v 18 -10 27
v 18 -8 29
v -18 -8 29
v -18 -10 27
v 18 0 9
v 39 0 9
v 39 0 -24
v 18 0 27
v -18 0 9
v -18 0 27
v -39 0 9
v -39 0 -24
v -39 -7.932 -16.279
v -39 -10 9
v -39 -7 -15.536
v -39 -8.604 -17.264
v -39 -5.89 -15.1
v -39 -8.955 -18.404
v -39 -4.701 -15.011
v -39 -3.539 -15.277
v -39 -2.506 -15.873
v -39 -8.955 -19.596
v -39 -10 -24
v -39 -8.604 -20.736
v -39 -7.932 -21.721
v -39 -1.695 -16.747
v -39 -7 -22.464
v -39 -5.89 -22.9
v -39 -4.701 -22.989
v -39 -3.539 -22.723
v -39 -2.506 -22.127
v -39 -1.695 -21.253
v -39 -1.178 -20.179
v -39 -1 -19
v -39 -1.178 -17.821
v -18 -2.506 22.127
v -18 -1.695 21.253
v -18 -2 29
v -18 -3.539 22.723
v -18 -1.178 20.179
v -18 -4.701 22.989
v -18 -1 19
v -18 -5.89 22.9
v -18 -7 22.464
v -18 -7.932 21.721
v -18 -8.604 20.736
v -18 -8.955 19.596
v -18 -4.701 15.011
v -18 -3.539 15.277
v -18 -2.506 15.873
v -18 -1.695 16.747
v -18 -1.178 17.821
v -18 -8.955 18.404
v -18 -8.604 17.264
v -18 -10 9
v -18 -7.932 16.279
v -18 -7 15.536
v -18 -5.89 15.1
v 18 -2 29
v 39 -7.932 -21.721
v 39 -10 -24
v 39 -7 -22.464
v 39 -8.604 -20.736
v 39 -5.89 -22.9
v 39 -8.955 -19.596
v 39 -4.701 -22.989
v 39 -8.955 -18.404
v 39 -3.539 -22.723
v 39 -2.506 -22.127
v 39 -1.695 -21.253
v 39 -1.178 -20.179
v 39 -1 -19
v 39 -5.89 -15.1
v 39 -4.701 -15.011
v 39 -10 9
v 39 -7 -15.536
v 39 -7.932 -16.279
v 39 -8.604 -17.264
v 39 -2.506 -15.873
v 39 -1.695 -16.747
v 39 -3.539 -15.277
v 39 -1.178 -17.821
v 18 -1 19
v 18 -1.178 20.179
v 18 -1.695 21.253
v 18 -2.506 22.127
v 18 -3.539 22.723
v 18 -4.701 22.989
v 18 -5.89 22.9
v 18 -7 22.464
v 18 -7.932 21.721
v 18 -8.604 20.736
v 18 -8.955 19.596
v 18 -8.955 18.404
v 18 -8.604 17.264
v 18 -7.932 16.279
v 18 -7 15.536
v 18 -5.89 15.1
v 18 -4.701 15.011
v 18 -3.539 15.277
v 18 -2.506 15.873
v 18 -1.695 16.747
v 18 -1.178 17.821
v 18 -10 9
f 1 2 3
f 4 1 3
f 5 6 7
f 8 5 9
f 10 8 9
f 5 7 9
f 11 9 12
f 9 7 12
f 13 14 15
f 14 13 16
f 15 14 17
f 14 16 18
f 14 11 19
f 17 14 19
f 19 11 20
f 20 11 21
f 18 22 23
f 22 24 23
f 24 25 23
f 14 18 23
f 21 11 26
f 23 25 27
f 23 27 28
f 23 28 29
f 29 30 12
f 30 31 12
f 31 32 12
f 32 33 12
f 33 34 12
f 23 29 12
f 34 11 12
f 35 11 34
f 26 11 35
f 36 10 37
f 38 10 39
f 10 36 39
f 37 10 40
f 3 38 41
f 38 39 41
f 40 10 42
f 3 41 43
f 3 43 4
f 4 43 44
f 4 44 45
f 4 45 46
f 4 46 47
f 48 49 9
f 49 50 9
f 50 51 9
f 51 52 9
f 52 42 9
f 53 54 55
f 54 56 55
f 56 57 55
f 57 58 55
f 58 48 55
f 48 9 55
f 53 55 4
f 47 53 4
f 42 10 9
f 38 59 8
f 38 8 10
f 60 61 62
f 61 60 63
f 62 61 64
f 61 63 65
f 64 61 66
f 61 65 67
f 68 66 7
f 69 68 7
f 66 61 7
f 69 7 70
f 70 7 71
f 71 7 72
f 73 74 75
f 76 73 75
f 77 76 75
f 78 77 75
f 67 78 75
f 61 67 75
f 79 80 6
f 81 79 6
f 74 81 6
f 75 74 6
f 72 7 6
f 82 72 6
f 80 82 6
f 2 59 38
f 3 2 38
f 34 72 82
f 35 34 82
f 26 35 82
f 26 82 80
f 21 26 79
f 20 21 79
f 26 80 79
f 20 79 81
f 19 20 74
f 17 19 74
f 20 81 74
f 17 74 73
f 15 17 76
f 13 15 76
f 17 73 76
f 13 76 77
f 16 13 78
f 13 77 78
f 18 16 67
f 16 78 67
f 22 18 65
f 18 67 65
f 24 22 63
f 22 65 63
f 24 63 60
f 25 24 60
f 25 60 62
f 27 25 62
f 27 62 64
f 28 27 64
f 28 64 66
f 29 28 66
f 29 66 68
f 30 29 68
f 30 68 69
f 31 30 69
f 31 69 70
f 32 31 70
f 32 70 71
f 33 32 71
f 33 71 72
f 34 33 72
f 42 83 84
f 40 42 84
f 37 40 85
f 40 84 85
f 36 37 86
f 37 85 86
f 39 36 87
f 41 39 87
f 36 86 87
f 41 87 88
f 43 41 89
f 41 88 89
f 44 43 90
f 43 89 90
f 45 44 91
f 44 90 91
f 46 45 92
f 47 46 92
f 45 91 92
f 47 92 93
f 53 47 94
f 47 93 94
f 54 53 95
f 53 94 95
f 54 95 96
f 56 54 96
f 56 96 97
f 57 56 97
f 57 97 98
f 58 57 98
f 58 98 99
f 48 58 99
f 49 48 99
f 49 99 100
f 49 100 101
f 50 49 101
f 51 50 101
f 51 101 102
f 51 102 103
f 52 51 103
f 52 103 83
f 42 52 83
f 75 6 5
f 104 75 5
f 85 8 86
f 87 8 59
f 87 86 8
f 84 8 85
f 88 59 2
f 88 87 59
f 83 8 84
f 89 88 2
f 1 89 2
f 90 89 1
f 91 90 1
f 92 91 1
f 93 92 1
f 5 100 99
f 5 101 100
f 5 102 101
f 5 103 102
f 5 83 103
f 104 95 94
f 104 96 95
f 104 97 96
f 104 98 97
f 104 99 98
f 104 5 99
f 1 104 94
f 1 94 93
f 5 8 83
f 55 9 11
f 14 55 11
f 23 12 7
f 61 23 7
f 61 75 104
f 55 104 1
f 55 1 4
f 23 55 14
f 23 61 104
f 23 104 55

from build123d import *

# Parameters (mm, degrees)
F1_DEPTH  = 10
F2_R      = 4
F3_DEPTH  = 38
F4_R      = 4
F5_DEPTH  = 70
F8_DEPTH  = 10
F9_R      = 4
F10_DEPTH = 40
F11_R     = 4
F12_DEPTH = 100
F13_DEPTH = 5
F14_SIZE  = 2


with BuildPart() as f1:
    # F0 (on Front) → F1 (new body)
    with BuildSketch(Plane.XZ):
        Polygon((19, 24), (-19, 24), (-19, 9), (-35, 9), (-35, -24), (35, -24), (35, 9), (19, 9), align=None)
    extrude(amount=F1_DEPTH)

    # F2 (on face) → F3 (cut)
    with BuildSketch(Plane.YZ.offset(19)):
        with Locations((-5, 19)):
            Circle(F2_R)
    extrude(amount=-F3_DEPTH, mode=Mode.SUBTRACT)

    # F4 (on face) → F5 (cut)
    with BuildSketch(Plane.YZ.offset(35)):
        with Locations((-5, -19)):
            Circle(F4_R)
    extrude(amount=-F5_DEPTH, mode=Mode.SUBTRACT)


with BuildPart() as f8:
    # F7 (on Front) → F8 (new body)
    with BuildSketch(Plane.XZ):
        Polygon((18, 24), (-18, 24), (-18, 9), (-39, 9), (-39, -24), (39, -24), (39, 9), (18, 9), align=None)
    extrude(amount=F8_DEPTH)

    # F9 (on face) → F10 (cut)
    with BuildSketch(Plane.YZ.offset(18)):
        with Locations((-5, 19)):
            Circle(F9_R)
    extrude(amount=-F10_DEPTH, mode=Mode.SUBTRACT)

    # F11 (on face) → F12 (cut)
    with BuildSketch(Plane.YZ.offset(39)):
        with Locations((-5, -19)):
            Circle(F11_R)
    extrude(amount=-F12_DEPTH, mode=Mode.SUBTRACT)

    # F13 (add): a face of the model
    f13_faces = [f8.faces().sort_by_distance(p)[0] for p in [
        (0, -5, 24),
    ]]
    extrude(f13_faces, amount=F13_DEPTH)

    # F14
    f14_edges = [f8.edges().sort_by_distance(p)[0] for p in [
        (0, -10, 29),
        (0, 0, 29),
    ]]
    chamfer(f14_edges, length=F14_SIZE)


solid = f8.part
